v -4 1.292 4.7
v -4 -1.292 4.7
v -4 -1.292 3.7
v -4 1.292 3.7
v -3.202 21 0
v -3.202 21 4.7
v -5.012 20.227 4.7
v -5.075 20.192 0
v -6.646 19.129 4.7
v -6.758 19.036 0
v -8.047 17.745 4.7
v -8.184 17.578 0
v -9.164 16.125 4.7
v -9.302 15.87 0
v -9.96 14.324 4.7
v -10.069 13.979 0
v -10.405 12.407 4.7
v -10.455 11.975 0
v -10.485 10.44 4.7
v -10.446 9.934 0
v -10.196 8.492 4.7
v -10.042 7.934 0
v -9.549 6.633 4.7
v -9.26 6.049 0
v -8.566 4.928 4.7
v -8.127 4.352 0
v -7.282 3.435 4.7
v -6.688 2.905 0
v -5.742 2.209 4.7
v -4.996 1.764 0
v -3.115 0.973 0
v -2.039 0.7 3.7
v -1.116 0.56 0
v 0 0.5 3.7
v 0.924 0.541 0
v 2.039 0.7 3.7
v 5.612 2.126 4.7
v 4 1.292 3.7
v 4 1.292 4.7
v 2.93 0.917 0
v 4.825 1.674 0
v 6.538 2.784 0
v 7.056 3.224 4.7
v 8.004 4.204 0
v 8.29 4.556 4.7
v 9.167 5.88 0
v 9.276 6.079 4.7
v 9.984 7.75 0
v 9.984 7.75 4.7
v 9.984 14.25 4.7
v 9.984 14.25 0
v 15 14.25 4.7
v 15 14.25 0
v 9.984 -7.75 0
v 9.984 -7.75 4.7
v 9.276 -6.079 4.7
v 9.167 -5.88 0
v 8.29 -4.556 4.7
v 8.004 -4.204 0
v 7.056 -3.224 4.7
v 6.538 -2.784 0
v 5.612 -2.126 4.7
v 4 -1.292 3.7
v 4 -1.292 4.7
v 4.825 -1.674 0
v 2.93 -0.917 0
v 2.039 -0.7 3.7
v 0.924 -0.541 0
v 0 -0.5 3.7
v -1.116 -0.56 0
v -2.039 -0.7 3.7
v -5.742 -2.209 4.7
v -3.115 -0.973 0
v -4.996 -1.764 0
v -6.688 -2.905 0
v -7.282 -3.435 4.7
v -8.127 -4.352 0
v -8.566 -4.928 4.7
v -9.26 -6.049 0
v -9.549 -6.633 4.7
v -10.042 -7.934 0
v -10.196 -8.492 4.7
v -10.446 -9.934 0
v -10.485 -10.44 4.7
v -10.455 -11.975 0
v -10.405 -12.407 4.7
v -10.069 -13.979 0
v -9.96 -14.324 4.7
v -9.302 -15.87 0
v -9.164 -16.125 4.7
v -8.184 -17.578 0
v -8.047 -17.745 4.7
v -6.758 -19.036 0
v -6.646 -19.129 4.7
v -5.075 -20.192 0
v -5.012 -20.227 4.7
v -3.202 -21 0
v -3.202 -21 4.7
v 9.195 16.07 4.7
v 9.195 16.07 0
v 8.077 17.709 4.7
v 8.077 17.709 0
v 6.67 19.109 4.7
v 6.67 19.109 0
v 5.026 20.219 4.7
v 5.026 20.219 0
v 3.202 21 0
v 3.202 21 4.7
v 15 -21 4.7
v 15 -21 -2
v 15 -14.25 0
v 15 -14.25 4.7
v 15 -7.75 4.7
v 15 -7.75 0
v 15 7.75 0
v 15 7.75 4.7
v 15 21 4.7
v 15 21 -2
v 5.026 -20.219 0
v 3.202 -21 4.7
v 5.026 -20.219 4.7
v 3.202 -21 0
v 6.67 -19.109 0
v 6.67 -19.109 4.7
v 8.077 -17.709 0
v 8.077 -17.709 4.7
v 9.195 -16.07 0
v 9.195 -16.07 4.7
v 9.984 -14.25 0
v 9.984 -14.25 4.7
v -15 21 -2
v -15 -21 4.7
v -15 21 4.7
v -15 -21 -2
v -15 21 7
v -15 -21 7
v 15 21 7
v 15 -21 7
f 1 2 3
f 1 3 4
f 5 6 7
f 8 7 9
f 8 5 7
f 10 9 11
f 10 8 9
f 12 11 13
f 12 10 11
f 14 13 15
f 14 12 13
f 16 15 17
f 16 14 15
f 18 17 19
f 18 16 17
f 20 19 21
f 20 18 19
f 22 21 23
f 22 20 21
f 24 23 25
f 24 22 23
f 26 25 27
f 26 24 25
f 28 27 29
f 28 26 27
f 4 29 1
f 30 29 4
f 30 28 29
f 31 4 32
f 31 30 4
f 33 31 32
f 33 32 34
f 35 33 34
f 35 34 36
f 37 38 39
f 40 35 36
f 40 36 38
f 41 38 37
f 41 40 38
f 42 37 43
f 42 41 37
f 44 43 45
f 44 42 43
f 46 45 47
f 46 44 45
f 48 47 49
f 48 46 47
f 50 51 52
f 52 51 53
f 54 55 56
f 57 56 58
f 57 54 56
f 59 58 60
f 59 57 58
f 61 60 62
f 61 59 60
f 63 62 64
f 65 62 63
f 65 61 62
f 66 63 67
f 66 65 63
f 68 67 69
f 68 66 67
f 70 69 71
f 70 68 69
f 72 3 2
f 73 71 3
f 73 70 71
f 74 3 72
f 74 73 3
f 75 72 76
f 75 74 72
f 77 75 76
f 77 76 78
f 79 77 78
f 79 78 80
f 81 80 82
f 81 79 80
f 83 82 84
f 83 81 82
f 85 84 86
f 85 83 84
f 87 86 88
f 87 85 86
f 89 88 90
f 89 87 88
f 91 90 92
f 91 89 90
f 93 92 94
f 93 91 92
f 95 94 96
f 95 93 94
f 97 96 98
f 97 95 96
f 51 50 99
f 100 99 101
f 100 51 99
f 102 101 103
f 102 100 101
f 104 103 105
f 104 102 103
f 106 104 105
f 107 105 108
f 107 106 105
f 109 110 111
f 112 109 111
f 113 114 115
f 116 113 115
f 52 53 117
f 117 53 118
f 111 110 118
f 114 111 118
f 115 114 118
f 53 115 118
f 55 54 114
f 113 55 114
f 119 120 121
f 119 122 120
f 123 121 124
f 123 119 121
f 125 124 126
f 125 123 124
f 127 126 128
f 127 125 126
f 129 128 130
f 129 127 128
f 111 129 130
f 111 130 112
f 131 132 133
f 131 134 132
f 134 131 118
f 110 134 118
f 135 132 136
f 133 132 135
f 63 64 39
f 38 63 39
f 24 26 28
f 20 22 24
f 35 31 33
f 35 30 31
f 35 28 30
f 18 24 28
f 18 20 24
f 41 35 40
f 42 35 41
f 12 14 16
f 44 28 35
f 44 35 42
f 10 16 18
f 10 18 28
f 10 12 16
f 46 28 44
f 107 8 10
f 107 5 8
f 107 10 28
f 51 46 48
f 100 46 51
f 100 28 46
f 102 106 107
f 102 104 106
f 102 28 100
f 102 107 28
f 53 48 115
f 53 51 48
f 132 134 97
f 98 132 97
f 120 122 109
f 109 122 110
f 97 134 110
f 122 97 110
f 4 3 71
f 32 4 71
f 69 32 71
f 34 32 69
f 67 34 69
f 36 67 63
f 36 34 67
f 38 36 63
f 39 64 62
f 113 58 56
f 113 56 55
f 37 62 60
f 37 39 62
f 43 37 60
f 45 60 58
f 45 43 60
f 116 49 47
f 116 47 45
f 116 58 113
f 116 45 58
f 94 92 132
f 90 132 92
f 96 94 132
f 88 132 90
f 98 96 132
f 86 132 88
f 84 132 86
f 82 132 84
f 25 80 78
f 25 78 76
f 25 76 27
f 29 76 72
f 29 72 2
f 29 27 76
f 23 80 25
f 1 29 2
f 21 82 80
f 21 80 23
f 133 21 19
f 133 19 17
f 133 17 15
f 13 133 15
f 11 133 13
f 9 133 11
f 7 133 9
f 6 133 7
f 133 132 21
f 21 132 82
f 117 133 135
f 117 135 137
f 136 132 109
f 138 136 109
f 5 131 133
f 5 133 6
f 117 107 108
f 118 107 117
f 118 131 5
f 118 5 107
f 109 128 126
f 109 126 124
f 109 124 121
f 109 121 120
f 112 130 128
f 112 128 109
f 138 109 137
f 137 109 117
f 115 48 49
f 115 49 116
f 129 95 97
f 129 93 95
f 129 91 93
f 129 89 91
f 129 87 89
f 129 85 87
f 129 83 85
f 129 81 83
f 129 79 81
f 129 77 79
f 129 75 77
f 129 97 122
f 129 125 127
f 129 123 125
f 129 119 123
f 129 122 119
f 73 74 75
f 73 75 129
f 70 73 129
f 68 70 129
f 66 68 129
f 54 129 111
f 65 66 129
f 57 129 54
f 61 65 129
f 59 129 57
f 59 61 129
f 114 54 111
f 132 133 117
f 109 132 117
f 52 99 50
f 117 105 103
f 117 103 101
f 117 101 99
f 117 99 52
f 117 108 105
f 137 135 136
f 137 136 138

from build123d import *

# Parameters (mm, degrees)
F0_W      = 30
F0_H      = 42
F3_DEPTH  = 2
F6_DEPTH  = 4.7
F7_DEPTH  = 2.3
F1_R      = 10.5
F8_DEPTH  = 25
F2_R      = 10.5
F9_DEPTH  = 25
F4_W      = 17.7234204819
F4_H      = 6.5
F10_DEPTH = 25
F5_W      = 18
F5_H      = 6.5
F11_DEPTH = 25
F12_W     = 8
F12_H     = 11.4227030426
F13_DEPTH = 1


with BuildPart() as f3:
    # F0 (on Top) → F3 (new body)
    with BuildSketch(Plane.XY):
        Rectangle(F0_W, F0_H)
    extrude(amount=-F3_DEPTH)

    # F0 (on Top) → F6 (join)
    with BuildSketch(Plane.XY):
        Rectangle(F0_W, F0_H)
    extrude(amount=F6_DEPTH)


with BuildPart() as f7:
    # F7 (new): a face of the model
    f7_faces = [f3.part.faces().sort_by_distance(p)[0] for p in [
        (0, 0, 4.7),
    ]]
    extrude(f7_faces, amount=F7_DEPTH)


with BuildPart() as f3_1:
    add(f3.part)

    # F1 (on face) → F8 (cut)
    with BuildSketch(Plane.XY):
        with Locations((0, 11)):
            Circle(F1_R)
    extrude(amount=F8_DEPTH, mode=Mode.SUBTRACT)

    # F2 (on face) → F9 (cut)
    with BuildSketch(Plane.XY):
        with Locations((0, -11)):
            Circle(F2_R)
    extrude(amount=F9_DEPTH, mode=Mode.SUBTRACT)

    # F4 (on face) → F10 (cut)
    with BuildSketch(Plane.XY):
        with Locations((8.8473405008, -11)):
            Rectangle(F4_W, F4_H)
    extrude(amount=F10_DEPTH, mode=Mode.SUBTRACT)

    # F5 (on face) → F11 (cut)
    with BuildSketch(Plane.XY):
        with Locations((9, 11)):
            Rectangle(F5_W, F5_H)
    extrude(amount=F11_DEPTH, mode=Mode.SUBTRACT)

    # F12 (on face) → F13 (cut)
    with BuildSketch(Plane.XY.offset(4.7)):
        Rectangle(F12_W, F12_H)
    extrude(amount=-F13_DEPTH, mode=Mode.SUBTRACT)


solid = Compound([f7.part, f3_1.part])
